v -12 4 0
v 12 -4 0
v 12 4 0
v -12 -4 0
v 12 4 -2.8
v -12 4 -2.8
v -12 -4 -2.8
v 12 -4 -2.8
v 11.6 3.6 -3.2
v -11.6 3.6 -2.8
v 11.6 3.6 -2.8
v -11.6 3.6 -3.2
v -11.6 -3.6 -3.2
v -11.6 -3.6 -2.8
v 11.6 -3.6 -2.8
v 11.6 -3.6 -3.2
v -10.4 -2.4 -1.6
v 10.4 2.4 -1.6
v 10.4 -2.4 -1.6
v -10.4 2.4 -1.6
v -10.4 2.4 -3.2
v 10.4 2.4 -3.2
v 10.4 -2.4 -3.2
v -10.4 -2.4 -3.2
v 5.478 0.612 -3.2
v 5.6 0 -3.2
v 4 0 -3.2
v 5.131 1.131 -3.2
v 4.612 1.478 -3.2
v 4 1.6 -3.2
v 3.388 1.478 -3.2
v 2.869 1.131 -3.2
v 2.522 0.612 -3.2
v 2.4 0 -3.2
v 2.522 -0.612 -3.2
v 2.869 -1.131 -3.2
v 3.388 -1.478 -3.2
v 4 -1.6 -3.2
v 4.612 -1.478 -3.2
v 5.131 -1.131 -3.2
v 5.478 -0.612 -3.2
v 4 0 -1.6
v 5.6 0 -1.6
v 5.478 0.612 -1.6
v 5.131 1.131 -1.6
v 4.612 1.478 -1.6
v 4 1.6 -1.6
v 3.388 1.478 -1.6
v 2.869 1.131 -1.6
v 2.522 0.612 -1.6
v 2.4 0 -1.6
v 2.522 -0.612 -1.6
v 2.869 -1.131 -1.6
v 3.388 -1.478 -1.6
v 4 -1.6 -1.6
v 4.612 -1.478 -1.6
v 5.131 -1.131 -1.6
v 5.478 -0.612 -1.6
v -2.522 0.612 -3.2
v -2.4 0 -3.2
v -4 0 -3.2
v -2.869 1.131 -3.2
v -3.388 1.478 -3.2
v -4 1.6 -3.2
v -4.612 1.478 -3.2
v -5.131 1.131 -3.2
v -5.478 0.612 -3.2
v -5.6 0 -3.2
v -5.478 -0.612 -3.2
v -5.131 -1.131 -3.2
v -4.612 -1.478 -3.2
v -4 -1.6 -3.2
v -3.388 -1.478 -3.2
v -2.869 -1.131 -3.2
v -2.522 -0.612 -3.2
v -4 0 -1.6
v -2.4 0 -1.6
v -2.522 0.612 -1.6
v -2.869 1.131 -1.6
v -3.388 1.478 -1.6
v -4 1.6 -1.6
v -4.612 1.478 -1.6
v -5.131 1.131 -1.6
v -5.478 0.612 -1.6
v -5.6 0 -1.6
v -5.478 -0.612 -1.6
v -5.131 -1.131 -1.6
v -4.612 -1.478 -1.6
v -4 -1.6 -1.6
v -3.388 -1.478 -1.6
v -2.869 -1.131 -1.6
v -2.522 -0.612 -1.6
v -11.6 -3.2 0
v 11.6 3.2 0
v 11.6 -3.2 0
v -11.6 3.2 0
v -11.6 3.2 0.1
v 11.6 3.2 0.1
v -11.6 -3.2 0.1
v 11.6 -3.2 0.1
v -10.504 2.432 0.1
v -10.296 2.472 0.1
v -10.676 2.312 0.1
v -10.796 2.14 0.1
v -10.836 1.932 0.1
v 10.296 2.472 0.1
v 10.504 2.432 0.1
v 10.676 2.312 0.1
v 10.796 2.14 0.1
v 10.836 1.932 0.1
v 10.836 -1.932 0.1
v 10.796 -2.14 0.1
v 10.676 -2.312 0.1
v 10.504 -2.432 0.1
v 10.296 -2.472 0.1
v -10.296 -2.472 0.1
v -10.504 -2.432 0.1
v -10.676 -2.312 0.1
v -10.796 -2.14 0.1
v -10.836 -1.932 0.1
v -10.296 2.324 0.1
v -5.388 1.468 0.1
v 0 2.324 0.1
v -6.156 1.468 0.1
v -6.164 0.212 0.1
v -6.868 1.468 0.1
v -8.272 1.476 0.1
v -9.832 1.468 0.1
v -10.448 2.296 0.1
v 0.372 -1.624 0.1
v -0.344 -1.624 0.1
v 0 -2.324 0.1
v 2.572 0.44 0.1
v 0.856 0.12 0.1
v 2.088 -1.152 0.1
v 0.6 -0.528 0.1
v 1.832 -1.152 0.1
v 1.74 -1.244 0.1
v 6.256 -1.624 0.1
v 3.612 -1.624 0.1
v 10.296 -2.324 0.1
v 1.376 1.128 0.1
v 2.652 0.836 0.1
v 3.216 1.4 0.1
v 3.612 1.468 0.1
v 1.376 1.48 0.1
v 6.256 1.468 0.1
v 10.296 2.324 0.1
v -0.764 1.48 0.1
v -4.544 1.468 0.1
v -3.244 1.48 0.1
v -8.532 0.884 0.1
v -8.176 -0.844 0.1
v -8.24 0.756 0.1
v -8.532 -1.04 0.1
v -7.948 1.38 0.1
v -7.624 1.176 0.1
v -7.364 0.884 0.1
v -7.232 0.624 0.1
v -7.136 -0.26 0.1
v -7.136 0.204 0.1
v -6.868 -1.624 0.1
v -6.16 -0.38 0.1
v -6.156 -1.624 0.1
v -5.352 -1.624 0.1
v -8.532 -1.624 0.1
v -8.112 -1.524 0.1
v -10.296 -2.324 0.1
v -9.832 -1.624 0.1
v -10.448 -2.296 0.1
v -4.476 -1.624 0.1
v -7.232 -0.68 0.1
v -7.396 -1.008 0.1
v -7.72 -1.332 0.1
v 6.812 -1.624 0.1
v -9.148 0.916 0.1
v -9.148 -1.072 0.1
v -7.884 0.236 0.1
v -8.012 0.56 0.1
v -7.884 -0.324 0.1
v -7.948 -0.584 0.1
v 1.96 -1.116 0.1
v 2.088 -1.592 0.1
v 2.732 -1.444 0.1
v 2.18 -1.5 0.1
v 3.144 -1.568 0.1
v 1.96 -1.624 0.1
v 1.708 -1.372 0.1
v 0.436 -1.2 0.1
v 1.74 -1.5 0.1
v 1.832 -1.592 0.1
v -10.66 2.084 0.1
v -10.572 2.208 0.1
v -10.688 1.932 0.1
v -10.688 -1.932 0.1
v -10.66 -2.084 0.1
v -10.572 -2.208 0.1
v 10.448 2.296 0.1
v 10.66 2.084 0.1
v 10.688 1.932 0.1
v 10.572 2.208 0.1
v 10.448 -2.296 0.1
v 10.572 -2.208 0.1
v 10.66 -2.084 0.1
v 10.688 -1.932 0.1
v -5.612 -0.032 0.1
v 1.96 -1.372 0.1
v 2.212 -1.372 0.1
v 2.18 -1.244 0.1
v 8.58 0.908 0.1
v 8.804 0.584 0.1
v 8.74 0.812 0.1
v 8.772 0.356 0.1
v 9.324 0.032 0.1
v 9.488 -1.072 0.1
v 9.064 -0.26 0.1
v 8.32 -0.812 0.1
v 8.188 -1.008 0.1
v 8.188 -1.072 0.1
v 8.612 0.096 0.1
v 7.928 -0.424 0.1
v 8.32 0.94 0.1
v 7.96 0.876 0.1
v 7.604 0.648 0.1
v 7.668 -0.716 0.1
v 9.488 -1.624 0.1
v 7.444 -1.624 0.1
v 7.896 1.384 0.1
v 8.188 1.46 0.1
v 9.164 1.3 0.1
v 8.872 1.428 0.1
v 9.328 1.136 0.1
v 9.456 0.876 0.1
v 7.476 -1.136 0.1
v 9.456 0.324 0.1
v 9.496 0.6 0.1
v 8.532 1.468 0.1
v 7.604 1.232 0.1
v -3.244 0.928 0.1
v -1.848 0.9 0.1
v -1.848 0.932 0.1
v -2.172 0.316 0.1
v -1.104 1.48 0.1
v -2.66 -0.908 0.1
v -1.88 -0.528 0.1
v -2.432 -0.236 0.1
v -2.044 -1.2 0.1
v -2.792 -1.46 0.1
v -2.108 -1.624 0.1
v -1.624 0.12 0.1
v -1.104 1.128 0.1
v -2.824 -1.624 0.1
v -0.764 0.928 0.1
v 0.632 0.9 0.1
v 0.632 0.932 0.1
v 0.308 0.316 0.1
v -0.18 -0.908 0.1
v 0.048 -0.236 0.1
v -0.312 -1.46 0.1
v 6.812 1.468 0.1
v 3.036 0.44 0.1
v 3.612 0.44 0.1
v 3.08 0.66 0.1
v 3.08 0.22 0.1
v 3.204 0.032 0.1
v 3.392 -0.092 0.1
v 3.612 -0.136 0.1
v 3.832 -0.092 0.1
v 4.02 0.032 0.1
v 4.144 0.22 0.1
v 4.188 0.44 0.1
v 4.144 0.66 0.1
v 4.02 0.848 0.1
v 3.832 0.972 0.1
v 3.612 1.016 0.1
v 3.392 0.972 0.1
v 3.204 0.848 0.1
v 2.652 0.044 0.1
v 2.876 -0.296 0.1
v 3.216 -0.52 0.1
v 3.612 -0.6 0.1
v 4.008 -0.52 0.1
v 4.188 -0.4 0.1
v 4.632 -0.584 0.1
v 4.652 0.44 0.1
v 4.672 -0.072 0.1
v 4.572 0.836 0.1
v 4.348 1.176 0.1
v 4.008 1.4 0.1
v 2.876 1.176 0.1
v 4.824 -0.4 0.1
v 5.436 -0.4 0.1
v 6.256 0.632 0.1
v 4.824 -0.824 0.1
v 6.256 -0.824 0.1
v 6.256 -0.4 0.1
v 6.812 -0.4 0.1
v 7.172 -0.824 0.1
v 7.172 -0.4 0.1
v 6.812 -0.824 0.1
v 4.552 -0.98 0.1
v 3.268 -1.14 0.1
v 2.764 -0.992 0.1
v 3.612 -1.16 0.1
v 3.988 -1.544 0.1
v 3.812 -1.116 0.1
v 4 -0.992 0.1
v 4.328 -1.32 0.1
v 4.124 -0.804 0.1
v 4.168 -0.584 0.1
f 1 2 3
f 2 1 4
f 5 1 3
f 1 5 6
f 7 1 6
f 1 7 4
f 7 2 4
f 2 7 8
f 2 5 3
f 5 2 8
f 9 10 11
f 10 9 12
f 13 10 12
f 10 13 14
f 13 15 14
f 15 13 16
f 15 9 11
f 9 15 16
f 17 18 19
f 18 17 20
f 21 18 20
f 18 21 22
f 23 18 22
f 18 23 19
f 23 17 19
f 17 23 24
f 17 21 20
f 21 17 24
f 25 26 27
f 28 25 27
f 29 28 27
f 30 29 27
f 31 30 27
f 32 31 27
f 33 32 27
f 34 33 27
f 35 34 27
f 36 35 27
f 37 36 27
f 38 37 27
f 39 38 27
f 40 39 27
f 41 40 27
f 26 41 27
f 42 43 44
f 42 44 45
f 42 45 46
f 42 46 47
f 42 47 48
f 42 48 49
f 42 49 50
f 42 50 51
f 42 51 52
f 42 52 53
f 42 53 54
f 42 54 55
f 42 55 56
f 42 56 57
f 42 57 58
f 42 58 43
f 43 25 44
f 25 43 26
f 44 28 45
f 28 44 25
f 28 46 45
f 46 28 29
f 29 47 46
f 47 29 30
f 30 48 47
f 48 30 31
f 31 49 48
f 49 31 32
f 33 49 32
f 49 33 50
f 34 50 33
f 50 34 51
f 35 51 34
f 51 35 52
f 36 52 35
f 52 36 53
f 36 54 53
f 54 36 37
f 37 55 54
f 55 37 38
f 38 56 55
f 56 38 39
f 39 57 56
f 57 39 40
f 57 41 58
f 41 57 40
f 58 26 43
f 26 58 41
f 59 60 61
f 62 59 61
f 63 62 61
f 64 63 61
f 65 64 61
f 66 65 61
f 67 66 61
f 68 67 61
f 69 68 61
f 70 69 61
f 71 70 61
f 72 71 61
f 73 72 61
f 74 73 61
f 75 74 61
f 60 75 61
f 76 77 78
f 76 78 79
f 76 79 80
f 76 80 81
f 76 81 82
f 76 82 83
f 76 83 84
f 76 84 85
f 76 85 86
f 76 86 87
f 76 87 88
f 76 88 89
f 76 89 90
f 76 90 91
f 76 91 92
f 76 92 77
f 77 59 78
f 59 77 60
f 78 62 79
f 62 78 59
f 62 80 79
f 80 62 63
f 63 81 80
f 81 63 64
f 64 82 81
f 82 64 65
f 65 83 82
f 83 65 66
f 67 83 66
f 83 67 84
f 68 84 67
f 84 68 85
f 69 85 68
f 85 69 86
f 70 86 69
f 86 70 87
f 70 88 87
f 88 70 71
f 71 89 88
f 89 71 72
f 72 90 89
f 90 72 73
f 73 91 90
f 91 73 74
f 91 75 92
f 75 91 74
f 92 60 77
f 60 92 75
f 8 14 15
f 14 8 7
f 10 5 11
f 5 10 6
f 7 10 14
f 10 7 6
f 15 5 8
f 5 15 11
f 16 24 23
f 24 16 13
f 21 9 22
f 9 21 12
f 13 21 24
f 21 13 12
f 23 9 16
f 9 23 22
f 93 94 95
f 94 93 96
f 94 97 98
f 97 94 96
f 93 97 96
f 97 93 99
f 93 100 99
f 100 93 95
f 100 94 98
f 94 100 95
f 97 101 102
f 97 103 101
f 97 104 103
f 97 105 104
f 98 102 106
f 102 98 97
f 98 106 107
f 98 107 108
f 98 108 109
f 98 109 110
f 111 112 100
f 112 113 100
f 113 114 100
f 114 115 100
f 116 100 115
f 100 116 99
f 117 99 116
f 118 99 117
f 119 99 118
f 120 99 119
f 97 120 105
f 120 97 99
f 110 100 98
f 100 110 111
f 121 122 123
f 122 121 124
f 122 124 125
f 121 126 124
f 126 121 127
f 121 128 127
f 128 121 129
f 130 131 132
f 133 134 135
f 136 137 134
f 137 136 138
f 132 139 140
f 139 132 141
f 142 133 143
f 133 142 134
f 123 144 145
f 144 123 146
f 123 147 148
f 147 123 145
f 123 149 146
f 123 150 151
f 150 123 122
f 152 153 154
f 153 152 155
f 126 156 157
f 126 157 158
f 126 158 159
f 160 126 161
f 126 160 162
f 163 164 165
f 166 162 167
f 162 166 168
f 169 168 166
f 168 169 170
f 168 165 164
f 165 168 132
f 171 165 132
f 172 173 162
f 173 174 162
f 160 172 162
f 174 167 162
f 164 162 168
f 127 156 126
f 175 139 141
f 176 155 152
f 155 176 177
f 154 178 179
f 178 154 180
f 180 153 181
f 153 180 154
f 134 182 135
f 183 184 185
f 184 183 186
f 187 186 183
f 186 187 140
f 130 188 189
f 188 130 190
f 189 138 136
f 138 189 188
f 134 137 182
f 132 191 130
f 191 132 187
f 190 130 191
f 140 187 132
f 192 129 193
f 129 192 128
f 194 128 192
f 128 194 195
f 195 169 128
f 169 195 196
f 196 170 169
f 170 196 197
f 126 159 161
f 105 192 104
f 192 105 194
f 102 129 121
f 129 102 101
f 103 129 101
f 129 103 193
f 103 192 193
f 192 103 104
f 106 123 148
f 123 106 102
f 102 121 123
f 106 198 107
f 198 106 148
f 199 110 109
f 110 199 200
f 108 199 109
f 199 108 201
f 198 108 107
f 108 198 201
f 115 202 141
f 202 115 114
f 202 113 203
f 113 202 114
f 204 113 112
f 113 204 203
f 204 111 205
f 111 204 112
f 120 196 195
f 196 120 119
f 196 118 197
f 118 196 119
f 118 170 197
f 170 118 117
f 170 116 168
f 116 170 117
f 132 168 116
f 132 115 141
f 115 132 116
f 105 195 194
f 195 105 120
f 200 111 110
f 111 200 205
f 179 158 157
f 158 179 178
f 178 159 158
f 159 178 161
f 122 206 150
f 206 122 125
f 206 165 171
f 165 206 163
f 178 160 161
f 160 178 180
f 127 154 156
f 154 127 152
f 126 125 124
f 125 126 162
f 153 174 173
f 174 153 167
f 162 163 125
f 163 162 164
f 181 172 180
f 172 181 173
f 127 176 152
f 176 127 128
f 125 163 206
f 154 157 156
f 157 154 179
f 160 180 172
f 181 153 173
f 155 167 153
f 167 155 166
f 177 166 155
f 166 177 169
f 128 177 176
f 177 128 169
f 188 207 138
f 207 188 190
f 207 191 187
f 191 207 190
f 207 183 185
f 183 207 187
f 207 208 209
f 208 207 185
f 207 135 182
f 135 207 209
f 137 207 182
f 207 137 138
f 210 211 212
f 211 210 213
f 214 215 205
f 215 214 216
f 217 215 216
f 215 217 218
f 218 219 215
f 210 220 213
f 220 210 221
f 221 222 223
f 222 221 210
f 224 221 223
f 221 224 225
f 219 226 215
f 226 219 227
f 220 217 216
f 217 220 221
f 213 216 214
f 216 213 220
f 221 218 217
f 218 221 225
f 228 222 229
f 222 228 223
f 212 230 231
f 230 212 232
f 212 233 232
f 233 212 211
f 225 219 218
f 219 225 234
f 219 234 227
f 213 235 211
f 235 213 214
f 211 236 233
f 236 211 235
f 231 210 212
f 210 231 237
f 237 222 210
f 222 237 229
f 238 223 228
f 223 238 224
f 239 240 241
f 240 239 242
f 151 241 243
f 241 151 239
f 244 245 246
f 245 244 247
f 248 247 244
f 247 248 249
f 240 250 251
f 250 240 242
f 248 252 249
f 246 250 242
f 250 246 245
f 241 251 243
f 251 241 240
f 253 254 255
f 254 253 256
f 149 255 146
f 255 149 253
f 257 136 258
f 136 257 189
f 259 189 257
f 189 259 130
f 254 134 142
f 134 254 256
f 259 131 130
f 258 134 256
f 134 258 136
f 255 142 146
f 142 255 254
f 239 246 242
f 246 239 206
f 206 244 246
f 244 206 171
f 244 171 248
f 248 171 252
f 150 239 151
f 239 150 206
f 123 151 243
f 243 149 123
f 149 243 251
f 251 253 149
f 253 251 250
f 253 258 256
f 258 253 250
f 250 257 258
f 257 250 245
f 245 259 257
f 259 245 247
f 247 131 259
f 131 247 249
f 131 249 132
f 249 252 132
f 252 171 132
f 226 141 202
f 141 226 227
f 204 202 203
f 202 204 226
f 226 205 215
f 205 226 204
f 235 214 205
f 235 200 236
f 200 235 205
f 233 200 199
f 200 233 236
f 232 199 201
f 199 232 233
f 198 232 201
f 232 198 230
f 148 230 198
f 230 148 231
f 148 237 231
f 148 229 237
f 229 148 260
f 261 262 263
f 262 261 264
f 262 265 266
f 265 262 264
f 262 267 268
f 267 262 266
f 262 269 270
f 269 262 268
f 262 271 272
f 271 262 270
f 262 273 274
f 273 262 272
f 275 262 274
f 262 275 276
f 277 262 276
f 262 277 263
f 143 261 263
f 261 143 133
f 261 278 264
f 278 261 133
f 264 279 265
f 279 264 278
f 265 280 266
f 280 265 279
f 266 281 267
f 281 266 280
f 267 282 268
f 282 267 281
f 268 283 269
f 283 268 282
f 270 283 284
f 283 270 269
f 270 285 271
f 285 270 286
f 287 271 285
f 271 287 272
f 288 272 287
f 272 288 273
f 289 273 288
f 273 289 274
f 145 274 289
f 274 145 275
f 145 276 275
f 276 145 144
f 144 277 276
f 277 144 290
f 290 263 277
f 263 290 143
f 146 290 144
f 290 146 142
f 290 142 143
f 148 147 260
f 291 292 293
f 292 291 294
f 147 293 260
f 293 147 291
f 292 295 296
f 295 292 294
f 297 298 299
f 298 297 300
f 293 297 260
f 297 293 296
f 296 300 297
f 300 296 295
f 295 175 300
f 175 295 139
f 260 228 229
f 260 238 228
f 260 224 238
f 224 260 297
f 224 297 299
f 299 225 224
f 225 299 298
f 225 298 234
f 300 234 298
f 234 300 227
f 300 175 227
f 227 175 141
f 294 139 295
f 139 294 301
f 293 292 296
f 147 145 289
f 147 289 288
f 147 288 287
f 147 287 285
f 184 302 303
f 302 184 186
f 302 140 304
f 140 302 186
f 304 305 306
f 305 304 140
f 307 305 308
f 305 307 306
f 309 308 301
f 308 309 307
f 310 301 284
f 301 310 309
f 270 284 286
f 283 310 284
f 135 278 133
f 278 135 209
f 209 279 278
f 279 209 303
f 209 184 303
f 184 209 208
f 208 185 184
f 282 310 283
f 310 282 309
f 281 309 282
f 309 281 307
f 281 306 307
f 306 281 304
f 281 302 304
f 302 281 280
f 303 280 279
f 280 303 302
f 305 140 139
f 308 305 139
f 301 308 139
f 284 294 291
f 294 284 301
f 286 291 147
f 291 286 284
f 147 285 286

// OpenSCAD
use <../lib.scad>
use <6372023j.scad>
use <63864.scad>
function ldraw_lib__63864d0l() = [
// 0 Tile  1 x  3 with "DK 77.942" Licence Plate Sticker
// 0 Name: 63864d0l.dat
// 0 Author: Vincent Messenet [Cheenzo]
// 0 !LDRAW_ORG Shortcut UPDATE 2026-07
// 0 !LICENSE Licensed under CC BY 4.0 : see CAreadme.txt
// 
// 0 BFC CERTIFY CCW
  [0,"BFC","CERTIFY"],
  [0,"BFC","CCW"],
// 
// 0 !CATEGORY Sticker Shortcut
// 0 !KEYWORDS Bricklink 63864pb186, Fiat 500, set 77942
// 
// 0 !HISTORY 2026-07-30 [OrionP] Official Update 2026-07
// 
// 1 16 0 0 0 1 0 0 0 1 0 0 0 1 63864.dat
  [1,16,0,0,0,1,0,0,0,1,0,0,0,1, ldraw_lib__63864()],
// 1 16 0 0 0 1 0 0 0 1 0 0 0 1 6372023j.dat
  [1,16,0,0,0,1,0,0,0,1,0,0,0,1, ldraw_lib__6372023j()],
];
module ldraw_lib__63864d0l(step=0, col=false, unit=2/5, alt=false, line=0.2, solid=!$preview)
    makepoly(ldraw_lib__63864d0l(), step=step, col=col, unit=unit, alt=alt, line=line, solid=solid);
ldraw_lib__63864d0l(line=0.2);
